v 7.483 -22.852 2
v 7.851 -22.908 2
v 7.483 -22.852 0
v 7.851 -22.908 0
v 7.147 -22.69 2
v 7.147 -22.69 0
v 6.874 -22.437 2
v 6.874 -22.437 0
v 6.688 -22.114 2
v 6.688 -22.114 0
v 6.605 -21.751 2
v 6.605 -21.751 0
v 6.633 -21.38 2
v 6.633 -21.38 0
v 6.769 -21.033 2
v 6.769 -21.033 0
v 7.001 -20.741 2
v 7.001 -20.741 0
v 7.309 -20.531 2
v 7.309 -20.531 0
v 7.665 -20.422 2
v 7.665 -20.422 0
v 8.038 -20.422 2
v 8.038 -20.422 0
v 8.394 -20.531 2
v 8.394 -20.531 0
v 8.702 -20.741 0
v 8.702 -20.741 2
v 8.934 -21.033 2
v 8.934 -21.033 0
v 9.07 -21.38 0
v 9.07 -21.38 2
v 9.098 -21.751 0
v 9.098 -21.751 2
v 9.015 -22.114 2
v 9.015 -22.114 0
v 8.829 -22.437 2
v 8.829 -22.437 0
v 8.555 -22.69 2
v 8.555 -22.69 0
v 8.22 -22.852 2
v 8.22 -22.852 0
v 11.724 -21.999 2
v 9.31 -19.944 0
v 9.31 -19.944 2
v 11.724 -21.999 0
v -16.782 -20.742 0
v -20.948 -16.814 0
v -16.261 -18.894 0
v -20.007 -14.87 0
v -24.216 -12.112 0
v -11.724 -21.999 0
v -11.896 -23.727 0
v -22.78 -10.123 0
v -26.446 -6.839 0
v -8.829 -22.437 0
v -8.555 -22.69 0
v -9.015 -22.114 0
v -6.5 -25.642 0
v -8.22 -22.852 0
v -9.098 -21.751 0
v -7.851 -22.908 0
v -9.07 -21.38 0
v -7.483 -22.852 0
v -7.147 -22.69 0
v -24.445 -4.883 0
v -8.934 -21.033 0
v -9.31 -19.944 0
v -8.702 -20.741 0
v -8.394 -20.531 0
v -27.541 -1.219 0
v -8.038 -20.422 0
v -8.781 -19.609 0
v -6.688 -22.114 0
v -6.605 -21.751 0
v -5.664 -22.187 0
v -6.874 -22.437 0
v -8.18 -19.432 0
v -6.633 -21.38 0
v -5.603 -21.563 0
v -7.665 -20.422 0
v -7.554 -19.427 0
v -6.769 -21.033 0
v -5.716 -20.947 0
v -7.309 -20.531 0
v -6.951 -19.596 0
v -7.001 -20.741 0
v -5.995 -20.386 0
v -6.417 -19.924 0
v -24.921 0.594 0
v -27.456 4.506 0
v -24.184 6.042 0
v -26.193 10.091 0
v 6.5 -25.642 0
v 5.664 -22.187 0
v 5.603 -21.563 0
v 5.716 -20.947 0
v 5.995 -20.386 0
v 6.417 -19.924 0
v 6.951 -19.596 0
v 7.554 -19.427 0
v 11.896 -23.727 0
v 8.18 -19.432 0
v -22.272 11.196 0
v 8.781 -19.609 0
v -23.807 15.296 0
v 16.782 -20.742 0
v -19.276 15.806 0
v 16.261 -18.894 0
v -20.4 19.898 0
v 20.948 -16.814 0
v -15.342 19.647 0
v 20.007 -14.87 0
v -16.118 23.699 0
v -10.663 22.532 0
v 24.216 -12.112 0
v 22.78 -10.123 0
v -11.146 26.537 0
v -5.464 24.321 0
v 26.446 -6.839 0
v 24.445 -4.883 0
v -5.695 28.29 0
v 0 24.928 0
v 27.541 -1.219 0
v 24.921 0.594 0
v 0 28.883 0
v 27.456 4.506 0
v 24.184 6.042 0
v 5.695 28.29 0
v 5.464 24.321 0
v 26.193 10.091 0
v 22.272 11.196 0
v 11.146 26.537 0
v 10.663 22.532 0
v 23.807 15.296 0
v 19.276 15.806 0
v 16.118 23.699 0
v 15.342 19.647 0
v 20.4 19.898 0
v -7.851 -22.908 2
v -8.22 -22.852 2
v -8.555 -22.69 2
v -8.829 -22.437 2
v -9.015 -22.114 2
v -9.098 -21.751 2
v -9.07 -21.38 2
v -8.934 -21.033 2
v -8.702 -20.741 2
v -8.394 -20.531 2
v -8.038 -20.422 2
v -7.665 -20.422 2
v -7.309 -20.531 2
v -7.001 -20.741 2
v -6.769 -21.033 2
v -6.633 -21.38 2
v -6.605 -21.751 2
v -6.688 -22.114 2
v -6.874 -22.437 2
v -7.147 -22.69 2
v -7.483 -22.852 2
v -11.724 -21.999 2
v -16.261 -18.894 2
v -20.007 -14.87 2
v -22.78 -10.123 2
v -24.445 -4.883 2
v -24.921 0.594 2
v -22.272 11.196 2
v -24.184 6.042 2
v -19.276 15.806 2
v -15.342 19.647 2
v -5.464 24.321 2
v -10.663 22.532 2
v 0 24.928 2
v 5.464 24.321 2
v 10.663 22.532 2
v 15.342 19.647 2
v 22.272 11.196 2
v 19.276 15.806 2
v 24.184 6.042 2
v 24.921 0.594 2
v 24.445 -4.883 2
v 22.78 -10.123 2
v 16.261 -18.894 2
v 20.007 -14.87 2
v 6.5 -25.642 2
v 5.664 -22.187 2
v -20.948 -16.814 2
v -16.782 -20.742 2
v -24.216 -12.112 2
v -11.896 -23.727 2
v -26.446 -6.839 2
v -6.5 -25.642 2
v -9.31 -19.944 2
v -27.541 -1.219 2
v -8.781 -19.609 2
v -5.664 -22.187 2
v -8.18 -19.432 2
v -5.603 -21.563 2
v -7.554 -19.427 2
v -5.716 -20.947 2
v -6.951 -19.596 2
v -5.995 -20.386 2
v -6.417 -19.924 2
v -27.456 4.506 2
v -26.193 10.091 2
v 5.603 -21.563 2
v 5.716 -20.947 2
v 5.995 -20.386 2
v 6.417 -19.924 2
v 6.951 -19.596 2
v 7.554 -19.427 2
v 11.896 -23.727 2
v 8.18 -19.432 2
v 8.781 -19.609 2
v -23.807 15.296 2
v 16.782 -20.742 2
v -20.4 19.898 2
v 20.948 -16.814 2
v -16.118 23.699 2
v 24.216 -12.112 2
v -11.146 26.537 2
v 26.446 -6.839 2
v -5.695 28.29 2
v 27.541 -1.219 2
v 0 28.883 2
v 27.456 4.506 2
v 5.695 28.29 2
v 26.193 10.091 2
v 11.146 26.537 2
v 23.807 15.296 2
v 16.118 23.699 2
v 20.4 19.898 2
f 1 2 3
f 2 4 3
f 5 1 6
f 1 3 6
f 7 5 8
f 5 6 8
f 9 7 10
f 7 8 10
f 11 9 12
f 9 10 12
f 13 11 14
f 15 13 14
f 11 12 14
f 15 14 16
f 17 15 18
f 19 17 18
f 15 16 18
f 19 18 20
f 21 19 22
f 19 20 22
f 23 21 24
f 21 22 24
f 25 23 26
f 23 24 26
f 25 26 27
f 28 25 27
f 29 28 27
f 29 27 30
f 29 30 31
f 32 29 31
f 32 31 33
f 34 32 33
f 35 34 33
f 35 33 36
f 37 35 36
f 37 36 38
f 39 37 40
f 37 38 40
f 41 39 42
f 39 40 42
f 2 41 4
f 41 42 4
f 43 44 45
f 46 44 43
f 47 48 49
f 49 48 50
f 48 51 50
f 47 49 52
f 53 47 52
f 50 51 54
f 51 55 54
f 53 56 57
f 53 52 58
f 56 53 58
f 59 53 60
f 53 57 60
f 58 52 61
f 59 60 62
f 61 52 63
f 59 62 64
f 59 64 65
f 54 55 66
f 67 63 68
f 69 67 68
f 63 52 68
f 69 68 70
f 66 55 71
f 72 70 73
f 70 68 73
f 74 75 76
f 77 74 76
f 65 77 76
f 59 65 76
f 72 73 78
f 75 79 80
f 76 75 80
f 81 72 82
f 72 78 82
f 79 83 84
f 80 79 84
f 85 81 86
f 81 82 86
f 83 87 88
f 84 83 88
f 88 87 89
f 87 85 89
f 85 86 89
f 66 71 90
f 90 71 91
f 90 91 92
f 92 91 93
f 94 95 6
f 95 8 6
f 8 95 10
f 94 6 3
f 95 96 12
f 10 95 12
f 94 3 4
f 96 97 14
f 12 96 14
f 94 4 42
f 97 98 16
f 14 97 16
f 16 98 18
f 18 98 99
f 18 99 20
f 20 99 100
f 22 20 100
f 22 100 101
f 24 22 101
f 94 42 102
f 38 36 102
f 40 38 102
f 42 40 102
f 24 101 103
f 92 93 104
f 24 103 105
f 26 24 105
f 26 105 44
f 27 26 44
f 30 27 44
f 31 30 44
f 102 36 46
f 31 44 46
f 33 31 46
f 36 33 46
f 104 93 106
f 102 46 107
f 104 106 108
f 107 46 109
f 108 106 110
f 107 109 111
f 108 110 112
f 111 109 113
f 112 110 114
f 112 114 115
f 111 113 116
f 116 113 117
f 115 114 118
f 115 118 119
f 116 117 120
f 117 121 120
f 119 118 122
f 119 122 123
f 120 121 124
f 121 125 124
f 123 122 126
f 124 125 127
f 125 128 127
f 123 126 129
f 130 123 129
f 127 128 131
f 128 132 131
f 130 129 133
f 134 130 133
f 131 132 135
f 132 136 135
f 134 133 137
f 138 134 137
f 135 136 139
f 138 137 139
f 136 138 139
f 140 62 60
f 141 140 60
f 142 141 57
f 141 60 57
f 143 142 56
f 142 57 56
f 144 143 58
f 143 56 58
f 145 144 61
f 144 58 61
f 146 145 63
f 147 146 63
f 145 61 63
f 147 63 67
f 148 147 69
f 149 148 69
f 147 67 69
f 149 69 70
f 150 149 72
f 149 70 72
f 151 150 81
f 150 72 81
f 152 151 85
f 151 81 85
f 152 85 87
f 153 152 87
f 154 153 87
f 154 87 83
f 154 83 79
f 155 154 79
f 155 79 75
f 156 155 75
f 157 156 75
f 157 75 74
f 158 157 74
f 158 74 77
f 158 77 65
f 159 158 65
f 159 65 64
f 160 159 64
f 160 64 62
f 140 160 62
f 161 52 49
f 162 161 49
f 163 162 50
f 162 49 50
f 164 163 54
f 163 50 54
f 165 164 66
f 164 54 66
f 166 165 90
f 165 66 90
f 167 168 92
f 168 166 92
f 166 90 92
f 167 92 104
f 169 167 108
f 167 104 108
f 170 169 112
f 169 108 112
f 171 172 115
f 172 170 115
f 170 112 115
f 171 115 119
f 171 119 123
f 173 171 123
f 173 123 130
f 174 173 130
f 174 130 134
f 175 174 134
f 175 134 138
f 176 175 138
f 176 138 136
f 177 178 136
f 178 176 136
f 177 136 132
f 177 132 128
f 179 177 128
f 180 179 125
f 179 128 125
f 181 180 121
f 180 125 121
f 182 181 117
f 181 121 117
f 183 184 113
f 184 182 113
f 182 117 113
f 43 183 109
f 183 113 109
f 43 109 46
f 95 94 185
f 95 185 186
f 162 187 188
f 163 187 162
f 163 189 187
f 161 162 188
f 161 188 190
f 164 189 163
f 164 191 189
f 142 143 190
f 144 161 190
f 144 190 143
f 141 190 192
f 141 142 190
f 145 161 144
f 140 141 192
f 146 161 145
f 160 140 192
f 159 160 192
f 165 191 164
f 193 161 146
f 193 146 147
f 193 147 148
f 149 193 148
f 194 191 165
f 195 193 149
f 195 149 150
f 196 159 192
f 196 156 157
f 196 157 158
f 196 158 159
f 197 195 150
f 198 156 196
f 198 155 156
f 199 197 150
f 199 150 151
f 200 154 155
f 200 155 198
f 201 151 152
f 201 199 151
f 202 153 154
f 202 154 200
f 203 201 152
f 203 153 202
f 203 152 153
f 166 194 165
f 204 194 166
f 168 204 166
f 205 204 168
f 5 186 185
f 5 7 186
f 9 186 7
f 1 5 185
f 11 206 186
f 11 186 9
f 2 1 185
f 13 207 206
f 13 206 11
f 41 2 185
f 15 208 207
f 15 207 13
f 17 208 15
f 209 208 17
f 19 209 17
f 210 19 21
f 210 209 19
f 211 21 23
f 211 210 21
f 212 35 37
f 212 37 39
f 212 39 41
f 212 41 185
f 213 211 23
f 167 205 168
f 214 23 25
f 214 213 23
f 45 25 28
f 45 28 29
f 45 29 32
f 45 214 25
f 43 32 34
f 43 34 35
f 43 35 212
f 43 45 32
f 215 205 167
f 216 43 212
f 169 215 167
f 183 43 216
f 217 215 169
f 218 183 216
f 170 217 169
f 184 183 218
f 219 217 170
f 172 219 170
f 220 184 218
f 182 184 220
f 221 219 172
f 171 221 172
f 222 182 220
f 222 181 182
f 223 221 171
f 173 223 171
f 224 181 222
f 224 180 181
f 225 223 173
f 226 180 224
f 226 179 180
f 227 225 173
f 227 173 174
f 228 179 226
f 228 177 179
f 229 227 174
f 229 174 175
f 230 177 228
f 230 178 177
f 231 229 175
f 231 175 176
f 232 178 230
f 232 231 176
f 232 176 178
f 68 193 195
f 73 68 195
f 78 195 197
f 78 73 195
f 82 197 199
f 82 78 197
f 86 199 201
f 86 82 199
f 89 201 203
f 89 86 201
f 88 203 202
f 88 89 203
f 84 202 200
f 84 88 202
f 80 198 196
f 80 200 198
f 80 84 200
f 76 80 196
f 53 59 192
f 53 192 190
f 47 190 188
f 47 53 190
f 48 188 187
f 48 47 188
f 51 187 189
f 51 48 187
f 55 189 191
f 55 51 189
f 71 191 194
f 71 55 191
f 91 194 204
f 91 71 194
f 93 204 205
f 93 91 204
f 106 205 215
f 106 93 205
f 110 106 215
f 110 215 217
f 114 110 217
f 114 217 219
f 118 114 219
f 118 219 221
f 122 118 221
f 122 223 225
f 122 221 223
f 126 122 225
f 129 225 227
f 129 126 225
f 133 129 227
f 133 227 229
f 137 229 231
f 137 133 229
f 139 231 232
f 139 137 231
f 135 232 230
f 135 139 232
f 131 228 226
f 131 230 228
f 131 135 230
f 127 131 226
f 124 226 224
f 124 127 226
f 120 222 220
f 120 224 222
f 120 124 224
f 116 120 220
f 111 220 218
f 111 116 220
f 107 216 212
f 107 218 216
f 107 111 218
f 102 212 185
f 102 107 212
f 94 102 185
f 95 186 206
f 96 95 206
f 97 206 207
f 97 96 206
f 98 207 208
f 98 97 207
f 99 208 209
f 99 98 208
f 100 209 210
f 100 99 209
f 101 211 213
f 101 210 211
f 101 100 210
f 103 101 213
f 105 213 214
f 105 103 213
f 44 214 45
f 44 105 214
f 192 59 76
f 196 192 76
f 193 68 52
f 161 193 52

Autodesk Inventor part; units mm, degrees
ref_plane "WorkPlane1" through (0, 0, 0) normal (0, 0, 1) x (1, 0, 0)
ref_plane "Work Plane2" through (0, 0, -2) normal (0, 0, 1) x (1, 0, 0)
ref_plane "WorkPlane2" through (0, 0, 1) normal (0, 0, 1) x (1, 0, 0)
sketch "Sketch1" plane through (0, 0, 0) normal (0, 0, 1) x (1, 0, 0)
  point P0 (0, 0)
sketch "Sketch2" plane through (0, 0, 0) normal (0, 0, 1) x (1, 0, 0)
  line L0 (6.5, -25.6418) -> (5.6643, -22.1866)
  arc A0 (9.3096, -19.9443) -> (5.6643, -22.1866) centre (7.8513, -21.6577) ccw
  line L1 (9.3096, -19.9443) -> (11.7235, -21.9989)
  arc A1 (11.7235, -21.9989) -> (-11.7235, -21.9989) centre (0, 0) ccw
  line L2 (-9.3096, -19.9443) -> (-11.7235, -21.9989)
  arc A2 (-5.6643, -22.1866) -> (-9.3096, -19.9443) centre (-7.8513, -21.6577) ccw
  line L3 (-6.5, -25.6418) -> (-5.6643, -22.1866)
  arc A3 (6.5, -25.6418) -> (-6.5, -25.6418) centre (0, 1.2333) ccw
  line L4 (0, 1.2333) -> (-6.5, -25.6418) construction
  line L5 (0, 1.2333) -> (6.5, -25.6418) construction
  dimension "d2" = 27.65
  dimension "d4" = 0
  dimension "d6" = 24.9278
  dimension "d8" = 1.2333
  dimension "d10" = 6.5
  dimension "d12" = 6.5
  dimension "d14" = 2.25
  dimension "d16" = 2.25
  dimension "d18" = 24.2
  dimension "d20" = 24.2
  dimension "d22" = 36
  dimension "d24" = 36
extrude "Extrusion1" add sketch "Sketch2" along normal blind 2
sketch "Sketch3" plane through (0, 0, 2) normal (0, 0, 1) x (1, 0, 0)
  arc A0 (-5.6643, -22.1866) -> (-9.3096, -19.9443) centre (-7.8513, -21.6577) ccw projected
hole "Hole1" at (-7.8513, -21.6577, 2) direction (0, 0, -1) diameter 2.5 end through all
sketch "Sketch4" plane through (0, 0, 2) normal (0, 0, 1) x (1, 0, 0)
  arc A0 (9.3096, -19.9443) -> (5.6643, -22.1866) centre (7.8513, -21.6577) ccw projected
hole "Hole2" at (7.8513, -21.6577, 2) direction (0, 0, -1) diameter 2.5 end through all
equation "\"d29\" = Diam5"
equation "\"d36\" = Diam5"
equation "\"d2\" = 0.5 * Diam2"
equation "\"d6\" = 0.5 * msp_dd1"
equation "\"d8\" = -0.5 * msp_dd1 + 0.5 * Diam2 - 0.222222 * ParA"
equation "\"d10\" = 2.6 * Diam5"
equation "\"d12\" = 2.6 * Diam5"
equation "\"d14\" = 0.9 * Diam5"
equation "\"d16\" = 0.9 * Diam5"
equation "\"d18\" = 1.3 * Diam5 + 0.5 * Diam2 - ParA"
equation "\"d20\" = 1.3 * Diam5 + 0.5 * Diam2 - ParA"
equation "\"d25\" = ParS"
equation "\"Diam5\" = 2.5"
equation "\"ParA\" = 6.7"
equation "\"ParS\" = 2"
equation "\"Diam2\" = 55.3"
equation "\"msp_dd1\" = -b + Diam2 - 0.111111 * ParA"
equation "\"msp_pom\" = 0.5 * Diam2 - b"
equation "\"TEMPLATE\" = 1.2345"
properties part number "ANSI B 27.7M - 3BMI-52" material "Steel, Mild"
